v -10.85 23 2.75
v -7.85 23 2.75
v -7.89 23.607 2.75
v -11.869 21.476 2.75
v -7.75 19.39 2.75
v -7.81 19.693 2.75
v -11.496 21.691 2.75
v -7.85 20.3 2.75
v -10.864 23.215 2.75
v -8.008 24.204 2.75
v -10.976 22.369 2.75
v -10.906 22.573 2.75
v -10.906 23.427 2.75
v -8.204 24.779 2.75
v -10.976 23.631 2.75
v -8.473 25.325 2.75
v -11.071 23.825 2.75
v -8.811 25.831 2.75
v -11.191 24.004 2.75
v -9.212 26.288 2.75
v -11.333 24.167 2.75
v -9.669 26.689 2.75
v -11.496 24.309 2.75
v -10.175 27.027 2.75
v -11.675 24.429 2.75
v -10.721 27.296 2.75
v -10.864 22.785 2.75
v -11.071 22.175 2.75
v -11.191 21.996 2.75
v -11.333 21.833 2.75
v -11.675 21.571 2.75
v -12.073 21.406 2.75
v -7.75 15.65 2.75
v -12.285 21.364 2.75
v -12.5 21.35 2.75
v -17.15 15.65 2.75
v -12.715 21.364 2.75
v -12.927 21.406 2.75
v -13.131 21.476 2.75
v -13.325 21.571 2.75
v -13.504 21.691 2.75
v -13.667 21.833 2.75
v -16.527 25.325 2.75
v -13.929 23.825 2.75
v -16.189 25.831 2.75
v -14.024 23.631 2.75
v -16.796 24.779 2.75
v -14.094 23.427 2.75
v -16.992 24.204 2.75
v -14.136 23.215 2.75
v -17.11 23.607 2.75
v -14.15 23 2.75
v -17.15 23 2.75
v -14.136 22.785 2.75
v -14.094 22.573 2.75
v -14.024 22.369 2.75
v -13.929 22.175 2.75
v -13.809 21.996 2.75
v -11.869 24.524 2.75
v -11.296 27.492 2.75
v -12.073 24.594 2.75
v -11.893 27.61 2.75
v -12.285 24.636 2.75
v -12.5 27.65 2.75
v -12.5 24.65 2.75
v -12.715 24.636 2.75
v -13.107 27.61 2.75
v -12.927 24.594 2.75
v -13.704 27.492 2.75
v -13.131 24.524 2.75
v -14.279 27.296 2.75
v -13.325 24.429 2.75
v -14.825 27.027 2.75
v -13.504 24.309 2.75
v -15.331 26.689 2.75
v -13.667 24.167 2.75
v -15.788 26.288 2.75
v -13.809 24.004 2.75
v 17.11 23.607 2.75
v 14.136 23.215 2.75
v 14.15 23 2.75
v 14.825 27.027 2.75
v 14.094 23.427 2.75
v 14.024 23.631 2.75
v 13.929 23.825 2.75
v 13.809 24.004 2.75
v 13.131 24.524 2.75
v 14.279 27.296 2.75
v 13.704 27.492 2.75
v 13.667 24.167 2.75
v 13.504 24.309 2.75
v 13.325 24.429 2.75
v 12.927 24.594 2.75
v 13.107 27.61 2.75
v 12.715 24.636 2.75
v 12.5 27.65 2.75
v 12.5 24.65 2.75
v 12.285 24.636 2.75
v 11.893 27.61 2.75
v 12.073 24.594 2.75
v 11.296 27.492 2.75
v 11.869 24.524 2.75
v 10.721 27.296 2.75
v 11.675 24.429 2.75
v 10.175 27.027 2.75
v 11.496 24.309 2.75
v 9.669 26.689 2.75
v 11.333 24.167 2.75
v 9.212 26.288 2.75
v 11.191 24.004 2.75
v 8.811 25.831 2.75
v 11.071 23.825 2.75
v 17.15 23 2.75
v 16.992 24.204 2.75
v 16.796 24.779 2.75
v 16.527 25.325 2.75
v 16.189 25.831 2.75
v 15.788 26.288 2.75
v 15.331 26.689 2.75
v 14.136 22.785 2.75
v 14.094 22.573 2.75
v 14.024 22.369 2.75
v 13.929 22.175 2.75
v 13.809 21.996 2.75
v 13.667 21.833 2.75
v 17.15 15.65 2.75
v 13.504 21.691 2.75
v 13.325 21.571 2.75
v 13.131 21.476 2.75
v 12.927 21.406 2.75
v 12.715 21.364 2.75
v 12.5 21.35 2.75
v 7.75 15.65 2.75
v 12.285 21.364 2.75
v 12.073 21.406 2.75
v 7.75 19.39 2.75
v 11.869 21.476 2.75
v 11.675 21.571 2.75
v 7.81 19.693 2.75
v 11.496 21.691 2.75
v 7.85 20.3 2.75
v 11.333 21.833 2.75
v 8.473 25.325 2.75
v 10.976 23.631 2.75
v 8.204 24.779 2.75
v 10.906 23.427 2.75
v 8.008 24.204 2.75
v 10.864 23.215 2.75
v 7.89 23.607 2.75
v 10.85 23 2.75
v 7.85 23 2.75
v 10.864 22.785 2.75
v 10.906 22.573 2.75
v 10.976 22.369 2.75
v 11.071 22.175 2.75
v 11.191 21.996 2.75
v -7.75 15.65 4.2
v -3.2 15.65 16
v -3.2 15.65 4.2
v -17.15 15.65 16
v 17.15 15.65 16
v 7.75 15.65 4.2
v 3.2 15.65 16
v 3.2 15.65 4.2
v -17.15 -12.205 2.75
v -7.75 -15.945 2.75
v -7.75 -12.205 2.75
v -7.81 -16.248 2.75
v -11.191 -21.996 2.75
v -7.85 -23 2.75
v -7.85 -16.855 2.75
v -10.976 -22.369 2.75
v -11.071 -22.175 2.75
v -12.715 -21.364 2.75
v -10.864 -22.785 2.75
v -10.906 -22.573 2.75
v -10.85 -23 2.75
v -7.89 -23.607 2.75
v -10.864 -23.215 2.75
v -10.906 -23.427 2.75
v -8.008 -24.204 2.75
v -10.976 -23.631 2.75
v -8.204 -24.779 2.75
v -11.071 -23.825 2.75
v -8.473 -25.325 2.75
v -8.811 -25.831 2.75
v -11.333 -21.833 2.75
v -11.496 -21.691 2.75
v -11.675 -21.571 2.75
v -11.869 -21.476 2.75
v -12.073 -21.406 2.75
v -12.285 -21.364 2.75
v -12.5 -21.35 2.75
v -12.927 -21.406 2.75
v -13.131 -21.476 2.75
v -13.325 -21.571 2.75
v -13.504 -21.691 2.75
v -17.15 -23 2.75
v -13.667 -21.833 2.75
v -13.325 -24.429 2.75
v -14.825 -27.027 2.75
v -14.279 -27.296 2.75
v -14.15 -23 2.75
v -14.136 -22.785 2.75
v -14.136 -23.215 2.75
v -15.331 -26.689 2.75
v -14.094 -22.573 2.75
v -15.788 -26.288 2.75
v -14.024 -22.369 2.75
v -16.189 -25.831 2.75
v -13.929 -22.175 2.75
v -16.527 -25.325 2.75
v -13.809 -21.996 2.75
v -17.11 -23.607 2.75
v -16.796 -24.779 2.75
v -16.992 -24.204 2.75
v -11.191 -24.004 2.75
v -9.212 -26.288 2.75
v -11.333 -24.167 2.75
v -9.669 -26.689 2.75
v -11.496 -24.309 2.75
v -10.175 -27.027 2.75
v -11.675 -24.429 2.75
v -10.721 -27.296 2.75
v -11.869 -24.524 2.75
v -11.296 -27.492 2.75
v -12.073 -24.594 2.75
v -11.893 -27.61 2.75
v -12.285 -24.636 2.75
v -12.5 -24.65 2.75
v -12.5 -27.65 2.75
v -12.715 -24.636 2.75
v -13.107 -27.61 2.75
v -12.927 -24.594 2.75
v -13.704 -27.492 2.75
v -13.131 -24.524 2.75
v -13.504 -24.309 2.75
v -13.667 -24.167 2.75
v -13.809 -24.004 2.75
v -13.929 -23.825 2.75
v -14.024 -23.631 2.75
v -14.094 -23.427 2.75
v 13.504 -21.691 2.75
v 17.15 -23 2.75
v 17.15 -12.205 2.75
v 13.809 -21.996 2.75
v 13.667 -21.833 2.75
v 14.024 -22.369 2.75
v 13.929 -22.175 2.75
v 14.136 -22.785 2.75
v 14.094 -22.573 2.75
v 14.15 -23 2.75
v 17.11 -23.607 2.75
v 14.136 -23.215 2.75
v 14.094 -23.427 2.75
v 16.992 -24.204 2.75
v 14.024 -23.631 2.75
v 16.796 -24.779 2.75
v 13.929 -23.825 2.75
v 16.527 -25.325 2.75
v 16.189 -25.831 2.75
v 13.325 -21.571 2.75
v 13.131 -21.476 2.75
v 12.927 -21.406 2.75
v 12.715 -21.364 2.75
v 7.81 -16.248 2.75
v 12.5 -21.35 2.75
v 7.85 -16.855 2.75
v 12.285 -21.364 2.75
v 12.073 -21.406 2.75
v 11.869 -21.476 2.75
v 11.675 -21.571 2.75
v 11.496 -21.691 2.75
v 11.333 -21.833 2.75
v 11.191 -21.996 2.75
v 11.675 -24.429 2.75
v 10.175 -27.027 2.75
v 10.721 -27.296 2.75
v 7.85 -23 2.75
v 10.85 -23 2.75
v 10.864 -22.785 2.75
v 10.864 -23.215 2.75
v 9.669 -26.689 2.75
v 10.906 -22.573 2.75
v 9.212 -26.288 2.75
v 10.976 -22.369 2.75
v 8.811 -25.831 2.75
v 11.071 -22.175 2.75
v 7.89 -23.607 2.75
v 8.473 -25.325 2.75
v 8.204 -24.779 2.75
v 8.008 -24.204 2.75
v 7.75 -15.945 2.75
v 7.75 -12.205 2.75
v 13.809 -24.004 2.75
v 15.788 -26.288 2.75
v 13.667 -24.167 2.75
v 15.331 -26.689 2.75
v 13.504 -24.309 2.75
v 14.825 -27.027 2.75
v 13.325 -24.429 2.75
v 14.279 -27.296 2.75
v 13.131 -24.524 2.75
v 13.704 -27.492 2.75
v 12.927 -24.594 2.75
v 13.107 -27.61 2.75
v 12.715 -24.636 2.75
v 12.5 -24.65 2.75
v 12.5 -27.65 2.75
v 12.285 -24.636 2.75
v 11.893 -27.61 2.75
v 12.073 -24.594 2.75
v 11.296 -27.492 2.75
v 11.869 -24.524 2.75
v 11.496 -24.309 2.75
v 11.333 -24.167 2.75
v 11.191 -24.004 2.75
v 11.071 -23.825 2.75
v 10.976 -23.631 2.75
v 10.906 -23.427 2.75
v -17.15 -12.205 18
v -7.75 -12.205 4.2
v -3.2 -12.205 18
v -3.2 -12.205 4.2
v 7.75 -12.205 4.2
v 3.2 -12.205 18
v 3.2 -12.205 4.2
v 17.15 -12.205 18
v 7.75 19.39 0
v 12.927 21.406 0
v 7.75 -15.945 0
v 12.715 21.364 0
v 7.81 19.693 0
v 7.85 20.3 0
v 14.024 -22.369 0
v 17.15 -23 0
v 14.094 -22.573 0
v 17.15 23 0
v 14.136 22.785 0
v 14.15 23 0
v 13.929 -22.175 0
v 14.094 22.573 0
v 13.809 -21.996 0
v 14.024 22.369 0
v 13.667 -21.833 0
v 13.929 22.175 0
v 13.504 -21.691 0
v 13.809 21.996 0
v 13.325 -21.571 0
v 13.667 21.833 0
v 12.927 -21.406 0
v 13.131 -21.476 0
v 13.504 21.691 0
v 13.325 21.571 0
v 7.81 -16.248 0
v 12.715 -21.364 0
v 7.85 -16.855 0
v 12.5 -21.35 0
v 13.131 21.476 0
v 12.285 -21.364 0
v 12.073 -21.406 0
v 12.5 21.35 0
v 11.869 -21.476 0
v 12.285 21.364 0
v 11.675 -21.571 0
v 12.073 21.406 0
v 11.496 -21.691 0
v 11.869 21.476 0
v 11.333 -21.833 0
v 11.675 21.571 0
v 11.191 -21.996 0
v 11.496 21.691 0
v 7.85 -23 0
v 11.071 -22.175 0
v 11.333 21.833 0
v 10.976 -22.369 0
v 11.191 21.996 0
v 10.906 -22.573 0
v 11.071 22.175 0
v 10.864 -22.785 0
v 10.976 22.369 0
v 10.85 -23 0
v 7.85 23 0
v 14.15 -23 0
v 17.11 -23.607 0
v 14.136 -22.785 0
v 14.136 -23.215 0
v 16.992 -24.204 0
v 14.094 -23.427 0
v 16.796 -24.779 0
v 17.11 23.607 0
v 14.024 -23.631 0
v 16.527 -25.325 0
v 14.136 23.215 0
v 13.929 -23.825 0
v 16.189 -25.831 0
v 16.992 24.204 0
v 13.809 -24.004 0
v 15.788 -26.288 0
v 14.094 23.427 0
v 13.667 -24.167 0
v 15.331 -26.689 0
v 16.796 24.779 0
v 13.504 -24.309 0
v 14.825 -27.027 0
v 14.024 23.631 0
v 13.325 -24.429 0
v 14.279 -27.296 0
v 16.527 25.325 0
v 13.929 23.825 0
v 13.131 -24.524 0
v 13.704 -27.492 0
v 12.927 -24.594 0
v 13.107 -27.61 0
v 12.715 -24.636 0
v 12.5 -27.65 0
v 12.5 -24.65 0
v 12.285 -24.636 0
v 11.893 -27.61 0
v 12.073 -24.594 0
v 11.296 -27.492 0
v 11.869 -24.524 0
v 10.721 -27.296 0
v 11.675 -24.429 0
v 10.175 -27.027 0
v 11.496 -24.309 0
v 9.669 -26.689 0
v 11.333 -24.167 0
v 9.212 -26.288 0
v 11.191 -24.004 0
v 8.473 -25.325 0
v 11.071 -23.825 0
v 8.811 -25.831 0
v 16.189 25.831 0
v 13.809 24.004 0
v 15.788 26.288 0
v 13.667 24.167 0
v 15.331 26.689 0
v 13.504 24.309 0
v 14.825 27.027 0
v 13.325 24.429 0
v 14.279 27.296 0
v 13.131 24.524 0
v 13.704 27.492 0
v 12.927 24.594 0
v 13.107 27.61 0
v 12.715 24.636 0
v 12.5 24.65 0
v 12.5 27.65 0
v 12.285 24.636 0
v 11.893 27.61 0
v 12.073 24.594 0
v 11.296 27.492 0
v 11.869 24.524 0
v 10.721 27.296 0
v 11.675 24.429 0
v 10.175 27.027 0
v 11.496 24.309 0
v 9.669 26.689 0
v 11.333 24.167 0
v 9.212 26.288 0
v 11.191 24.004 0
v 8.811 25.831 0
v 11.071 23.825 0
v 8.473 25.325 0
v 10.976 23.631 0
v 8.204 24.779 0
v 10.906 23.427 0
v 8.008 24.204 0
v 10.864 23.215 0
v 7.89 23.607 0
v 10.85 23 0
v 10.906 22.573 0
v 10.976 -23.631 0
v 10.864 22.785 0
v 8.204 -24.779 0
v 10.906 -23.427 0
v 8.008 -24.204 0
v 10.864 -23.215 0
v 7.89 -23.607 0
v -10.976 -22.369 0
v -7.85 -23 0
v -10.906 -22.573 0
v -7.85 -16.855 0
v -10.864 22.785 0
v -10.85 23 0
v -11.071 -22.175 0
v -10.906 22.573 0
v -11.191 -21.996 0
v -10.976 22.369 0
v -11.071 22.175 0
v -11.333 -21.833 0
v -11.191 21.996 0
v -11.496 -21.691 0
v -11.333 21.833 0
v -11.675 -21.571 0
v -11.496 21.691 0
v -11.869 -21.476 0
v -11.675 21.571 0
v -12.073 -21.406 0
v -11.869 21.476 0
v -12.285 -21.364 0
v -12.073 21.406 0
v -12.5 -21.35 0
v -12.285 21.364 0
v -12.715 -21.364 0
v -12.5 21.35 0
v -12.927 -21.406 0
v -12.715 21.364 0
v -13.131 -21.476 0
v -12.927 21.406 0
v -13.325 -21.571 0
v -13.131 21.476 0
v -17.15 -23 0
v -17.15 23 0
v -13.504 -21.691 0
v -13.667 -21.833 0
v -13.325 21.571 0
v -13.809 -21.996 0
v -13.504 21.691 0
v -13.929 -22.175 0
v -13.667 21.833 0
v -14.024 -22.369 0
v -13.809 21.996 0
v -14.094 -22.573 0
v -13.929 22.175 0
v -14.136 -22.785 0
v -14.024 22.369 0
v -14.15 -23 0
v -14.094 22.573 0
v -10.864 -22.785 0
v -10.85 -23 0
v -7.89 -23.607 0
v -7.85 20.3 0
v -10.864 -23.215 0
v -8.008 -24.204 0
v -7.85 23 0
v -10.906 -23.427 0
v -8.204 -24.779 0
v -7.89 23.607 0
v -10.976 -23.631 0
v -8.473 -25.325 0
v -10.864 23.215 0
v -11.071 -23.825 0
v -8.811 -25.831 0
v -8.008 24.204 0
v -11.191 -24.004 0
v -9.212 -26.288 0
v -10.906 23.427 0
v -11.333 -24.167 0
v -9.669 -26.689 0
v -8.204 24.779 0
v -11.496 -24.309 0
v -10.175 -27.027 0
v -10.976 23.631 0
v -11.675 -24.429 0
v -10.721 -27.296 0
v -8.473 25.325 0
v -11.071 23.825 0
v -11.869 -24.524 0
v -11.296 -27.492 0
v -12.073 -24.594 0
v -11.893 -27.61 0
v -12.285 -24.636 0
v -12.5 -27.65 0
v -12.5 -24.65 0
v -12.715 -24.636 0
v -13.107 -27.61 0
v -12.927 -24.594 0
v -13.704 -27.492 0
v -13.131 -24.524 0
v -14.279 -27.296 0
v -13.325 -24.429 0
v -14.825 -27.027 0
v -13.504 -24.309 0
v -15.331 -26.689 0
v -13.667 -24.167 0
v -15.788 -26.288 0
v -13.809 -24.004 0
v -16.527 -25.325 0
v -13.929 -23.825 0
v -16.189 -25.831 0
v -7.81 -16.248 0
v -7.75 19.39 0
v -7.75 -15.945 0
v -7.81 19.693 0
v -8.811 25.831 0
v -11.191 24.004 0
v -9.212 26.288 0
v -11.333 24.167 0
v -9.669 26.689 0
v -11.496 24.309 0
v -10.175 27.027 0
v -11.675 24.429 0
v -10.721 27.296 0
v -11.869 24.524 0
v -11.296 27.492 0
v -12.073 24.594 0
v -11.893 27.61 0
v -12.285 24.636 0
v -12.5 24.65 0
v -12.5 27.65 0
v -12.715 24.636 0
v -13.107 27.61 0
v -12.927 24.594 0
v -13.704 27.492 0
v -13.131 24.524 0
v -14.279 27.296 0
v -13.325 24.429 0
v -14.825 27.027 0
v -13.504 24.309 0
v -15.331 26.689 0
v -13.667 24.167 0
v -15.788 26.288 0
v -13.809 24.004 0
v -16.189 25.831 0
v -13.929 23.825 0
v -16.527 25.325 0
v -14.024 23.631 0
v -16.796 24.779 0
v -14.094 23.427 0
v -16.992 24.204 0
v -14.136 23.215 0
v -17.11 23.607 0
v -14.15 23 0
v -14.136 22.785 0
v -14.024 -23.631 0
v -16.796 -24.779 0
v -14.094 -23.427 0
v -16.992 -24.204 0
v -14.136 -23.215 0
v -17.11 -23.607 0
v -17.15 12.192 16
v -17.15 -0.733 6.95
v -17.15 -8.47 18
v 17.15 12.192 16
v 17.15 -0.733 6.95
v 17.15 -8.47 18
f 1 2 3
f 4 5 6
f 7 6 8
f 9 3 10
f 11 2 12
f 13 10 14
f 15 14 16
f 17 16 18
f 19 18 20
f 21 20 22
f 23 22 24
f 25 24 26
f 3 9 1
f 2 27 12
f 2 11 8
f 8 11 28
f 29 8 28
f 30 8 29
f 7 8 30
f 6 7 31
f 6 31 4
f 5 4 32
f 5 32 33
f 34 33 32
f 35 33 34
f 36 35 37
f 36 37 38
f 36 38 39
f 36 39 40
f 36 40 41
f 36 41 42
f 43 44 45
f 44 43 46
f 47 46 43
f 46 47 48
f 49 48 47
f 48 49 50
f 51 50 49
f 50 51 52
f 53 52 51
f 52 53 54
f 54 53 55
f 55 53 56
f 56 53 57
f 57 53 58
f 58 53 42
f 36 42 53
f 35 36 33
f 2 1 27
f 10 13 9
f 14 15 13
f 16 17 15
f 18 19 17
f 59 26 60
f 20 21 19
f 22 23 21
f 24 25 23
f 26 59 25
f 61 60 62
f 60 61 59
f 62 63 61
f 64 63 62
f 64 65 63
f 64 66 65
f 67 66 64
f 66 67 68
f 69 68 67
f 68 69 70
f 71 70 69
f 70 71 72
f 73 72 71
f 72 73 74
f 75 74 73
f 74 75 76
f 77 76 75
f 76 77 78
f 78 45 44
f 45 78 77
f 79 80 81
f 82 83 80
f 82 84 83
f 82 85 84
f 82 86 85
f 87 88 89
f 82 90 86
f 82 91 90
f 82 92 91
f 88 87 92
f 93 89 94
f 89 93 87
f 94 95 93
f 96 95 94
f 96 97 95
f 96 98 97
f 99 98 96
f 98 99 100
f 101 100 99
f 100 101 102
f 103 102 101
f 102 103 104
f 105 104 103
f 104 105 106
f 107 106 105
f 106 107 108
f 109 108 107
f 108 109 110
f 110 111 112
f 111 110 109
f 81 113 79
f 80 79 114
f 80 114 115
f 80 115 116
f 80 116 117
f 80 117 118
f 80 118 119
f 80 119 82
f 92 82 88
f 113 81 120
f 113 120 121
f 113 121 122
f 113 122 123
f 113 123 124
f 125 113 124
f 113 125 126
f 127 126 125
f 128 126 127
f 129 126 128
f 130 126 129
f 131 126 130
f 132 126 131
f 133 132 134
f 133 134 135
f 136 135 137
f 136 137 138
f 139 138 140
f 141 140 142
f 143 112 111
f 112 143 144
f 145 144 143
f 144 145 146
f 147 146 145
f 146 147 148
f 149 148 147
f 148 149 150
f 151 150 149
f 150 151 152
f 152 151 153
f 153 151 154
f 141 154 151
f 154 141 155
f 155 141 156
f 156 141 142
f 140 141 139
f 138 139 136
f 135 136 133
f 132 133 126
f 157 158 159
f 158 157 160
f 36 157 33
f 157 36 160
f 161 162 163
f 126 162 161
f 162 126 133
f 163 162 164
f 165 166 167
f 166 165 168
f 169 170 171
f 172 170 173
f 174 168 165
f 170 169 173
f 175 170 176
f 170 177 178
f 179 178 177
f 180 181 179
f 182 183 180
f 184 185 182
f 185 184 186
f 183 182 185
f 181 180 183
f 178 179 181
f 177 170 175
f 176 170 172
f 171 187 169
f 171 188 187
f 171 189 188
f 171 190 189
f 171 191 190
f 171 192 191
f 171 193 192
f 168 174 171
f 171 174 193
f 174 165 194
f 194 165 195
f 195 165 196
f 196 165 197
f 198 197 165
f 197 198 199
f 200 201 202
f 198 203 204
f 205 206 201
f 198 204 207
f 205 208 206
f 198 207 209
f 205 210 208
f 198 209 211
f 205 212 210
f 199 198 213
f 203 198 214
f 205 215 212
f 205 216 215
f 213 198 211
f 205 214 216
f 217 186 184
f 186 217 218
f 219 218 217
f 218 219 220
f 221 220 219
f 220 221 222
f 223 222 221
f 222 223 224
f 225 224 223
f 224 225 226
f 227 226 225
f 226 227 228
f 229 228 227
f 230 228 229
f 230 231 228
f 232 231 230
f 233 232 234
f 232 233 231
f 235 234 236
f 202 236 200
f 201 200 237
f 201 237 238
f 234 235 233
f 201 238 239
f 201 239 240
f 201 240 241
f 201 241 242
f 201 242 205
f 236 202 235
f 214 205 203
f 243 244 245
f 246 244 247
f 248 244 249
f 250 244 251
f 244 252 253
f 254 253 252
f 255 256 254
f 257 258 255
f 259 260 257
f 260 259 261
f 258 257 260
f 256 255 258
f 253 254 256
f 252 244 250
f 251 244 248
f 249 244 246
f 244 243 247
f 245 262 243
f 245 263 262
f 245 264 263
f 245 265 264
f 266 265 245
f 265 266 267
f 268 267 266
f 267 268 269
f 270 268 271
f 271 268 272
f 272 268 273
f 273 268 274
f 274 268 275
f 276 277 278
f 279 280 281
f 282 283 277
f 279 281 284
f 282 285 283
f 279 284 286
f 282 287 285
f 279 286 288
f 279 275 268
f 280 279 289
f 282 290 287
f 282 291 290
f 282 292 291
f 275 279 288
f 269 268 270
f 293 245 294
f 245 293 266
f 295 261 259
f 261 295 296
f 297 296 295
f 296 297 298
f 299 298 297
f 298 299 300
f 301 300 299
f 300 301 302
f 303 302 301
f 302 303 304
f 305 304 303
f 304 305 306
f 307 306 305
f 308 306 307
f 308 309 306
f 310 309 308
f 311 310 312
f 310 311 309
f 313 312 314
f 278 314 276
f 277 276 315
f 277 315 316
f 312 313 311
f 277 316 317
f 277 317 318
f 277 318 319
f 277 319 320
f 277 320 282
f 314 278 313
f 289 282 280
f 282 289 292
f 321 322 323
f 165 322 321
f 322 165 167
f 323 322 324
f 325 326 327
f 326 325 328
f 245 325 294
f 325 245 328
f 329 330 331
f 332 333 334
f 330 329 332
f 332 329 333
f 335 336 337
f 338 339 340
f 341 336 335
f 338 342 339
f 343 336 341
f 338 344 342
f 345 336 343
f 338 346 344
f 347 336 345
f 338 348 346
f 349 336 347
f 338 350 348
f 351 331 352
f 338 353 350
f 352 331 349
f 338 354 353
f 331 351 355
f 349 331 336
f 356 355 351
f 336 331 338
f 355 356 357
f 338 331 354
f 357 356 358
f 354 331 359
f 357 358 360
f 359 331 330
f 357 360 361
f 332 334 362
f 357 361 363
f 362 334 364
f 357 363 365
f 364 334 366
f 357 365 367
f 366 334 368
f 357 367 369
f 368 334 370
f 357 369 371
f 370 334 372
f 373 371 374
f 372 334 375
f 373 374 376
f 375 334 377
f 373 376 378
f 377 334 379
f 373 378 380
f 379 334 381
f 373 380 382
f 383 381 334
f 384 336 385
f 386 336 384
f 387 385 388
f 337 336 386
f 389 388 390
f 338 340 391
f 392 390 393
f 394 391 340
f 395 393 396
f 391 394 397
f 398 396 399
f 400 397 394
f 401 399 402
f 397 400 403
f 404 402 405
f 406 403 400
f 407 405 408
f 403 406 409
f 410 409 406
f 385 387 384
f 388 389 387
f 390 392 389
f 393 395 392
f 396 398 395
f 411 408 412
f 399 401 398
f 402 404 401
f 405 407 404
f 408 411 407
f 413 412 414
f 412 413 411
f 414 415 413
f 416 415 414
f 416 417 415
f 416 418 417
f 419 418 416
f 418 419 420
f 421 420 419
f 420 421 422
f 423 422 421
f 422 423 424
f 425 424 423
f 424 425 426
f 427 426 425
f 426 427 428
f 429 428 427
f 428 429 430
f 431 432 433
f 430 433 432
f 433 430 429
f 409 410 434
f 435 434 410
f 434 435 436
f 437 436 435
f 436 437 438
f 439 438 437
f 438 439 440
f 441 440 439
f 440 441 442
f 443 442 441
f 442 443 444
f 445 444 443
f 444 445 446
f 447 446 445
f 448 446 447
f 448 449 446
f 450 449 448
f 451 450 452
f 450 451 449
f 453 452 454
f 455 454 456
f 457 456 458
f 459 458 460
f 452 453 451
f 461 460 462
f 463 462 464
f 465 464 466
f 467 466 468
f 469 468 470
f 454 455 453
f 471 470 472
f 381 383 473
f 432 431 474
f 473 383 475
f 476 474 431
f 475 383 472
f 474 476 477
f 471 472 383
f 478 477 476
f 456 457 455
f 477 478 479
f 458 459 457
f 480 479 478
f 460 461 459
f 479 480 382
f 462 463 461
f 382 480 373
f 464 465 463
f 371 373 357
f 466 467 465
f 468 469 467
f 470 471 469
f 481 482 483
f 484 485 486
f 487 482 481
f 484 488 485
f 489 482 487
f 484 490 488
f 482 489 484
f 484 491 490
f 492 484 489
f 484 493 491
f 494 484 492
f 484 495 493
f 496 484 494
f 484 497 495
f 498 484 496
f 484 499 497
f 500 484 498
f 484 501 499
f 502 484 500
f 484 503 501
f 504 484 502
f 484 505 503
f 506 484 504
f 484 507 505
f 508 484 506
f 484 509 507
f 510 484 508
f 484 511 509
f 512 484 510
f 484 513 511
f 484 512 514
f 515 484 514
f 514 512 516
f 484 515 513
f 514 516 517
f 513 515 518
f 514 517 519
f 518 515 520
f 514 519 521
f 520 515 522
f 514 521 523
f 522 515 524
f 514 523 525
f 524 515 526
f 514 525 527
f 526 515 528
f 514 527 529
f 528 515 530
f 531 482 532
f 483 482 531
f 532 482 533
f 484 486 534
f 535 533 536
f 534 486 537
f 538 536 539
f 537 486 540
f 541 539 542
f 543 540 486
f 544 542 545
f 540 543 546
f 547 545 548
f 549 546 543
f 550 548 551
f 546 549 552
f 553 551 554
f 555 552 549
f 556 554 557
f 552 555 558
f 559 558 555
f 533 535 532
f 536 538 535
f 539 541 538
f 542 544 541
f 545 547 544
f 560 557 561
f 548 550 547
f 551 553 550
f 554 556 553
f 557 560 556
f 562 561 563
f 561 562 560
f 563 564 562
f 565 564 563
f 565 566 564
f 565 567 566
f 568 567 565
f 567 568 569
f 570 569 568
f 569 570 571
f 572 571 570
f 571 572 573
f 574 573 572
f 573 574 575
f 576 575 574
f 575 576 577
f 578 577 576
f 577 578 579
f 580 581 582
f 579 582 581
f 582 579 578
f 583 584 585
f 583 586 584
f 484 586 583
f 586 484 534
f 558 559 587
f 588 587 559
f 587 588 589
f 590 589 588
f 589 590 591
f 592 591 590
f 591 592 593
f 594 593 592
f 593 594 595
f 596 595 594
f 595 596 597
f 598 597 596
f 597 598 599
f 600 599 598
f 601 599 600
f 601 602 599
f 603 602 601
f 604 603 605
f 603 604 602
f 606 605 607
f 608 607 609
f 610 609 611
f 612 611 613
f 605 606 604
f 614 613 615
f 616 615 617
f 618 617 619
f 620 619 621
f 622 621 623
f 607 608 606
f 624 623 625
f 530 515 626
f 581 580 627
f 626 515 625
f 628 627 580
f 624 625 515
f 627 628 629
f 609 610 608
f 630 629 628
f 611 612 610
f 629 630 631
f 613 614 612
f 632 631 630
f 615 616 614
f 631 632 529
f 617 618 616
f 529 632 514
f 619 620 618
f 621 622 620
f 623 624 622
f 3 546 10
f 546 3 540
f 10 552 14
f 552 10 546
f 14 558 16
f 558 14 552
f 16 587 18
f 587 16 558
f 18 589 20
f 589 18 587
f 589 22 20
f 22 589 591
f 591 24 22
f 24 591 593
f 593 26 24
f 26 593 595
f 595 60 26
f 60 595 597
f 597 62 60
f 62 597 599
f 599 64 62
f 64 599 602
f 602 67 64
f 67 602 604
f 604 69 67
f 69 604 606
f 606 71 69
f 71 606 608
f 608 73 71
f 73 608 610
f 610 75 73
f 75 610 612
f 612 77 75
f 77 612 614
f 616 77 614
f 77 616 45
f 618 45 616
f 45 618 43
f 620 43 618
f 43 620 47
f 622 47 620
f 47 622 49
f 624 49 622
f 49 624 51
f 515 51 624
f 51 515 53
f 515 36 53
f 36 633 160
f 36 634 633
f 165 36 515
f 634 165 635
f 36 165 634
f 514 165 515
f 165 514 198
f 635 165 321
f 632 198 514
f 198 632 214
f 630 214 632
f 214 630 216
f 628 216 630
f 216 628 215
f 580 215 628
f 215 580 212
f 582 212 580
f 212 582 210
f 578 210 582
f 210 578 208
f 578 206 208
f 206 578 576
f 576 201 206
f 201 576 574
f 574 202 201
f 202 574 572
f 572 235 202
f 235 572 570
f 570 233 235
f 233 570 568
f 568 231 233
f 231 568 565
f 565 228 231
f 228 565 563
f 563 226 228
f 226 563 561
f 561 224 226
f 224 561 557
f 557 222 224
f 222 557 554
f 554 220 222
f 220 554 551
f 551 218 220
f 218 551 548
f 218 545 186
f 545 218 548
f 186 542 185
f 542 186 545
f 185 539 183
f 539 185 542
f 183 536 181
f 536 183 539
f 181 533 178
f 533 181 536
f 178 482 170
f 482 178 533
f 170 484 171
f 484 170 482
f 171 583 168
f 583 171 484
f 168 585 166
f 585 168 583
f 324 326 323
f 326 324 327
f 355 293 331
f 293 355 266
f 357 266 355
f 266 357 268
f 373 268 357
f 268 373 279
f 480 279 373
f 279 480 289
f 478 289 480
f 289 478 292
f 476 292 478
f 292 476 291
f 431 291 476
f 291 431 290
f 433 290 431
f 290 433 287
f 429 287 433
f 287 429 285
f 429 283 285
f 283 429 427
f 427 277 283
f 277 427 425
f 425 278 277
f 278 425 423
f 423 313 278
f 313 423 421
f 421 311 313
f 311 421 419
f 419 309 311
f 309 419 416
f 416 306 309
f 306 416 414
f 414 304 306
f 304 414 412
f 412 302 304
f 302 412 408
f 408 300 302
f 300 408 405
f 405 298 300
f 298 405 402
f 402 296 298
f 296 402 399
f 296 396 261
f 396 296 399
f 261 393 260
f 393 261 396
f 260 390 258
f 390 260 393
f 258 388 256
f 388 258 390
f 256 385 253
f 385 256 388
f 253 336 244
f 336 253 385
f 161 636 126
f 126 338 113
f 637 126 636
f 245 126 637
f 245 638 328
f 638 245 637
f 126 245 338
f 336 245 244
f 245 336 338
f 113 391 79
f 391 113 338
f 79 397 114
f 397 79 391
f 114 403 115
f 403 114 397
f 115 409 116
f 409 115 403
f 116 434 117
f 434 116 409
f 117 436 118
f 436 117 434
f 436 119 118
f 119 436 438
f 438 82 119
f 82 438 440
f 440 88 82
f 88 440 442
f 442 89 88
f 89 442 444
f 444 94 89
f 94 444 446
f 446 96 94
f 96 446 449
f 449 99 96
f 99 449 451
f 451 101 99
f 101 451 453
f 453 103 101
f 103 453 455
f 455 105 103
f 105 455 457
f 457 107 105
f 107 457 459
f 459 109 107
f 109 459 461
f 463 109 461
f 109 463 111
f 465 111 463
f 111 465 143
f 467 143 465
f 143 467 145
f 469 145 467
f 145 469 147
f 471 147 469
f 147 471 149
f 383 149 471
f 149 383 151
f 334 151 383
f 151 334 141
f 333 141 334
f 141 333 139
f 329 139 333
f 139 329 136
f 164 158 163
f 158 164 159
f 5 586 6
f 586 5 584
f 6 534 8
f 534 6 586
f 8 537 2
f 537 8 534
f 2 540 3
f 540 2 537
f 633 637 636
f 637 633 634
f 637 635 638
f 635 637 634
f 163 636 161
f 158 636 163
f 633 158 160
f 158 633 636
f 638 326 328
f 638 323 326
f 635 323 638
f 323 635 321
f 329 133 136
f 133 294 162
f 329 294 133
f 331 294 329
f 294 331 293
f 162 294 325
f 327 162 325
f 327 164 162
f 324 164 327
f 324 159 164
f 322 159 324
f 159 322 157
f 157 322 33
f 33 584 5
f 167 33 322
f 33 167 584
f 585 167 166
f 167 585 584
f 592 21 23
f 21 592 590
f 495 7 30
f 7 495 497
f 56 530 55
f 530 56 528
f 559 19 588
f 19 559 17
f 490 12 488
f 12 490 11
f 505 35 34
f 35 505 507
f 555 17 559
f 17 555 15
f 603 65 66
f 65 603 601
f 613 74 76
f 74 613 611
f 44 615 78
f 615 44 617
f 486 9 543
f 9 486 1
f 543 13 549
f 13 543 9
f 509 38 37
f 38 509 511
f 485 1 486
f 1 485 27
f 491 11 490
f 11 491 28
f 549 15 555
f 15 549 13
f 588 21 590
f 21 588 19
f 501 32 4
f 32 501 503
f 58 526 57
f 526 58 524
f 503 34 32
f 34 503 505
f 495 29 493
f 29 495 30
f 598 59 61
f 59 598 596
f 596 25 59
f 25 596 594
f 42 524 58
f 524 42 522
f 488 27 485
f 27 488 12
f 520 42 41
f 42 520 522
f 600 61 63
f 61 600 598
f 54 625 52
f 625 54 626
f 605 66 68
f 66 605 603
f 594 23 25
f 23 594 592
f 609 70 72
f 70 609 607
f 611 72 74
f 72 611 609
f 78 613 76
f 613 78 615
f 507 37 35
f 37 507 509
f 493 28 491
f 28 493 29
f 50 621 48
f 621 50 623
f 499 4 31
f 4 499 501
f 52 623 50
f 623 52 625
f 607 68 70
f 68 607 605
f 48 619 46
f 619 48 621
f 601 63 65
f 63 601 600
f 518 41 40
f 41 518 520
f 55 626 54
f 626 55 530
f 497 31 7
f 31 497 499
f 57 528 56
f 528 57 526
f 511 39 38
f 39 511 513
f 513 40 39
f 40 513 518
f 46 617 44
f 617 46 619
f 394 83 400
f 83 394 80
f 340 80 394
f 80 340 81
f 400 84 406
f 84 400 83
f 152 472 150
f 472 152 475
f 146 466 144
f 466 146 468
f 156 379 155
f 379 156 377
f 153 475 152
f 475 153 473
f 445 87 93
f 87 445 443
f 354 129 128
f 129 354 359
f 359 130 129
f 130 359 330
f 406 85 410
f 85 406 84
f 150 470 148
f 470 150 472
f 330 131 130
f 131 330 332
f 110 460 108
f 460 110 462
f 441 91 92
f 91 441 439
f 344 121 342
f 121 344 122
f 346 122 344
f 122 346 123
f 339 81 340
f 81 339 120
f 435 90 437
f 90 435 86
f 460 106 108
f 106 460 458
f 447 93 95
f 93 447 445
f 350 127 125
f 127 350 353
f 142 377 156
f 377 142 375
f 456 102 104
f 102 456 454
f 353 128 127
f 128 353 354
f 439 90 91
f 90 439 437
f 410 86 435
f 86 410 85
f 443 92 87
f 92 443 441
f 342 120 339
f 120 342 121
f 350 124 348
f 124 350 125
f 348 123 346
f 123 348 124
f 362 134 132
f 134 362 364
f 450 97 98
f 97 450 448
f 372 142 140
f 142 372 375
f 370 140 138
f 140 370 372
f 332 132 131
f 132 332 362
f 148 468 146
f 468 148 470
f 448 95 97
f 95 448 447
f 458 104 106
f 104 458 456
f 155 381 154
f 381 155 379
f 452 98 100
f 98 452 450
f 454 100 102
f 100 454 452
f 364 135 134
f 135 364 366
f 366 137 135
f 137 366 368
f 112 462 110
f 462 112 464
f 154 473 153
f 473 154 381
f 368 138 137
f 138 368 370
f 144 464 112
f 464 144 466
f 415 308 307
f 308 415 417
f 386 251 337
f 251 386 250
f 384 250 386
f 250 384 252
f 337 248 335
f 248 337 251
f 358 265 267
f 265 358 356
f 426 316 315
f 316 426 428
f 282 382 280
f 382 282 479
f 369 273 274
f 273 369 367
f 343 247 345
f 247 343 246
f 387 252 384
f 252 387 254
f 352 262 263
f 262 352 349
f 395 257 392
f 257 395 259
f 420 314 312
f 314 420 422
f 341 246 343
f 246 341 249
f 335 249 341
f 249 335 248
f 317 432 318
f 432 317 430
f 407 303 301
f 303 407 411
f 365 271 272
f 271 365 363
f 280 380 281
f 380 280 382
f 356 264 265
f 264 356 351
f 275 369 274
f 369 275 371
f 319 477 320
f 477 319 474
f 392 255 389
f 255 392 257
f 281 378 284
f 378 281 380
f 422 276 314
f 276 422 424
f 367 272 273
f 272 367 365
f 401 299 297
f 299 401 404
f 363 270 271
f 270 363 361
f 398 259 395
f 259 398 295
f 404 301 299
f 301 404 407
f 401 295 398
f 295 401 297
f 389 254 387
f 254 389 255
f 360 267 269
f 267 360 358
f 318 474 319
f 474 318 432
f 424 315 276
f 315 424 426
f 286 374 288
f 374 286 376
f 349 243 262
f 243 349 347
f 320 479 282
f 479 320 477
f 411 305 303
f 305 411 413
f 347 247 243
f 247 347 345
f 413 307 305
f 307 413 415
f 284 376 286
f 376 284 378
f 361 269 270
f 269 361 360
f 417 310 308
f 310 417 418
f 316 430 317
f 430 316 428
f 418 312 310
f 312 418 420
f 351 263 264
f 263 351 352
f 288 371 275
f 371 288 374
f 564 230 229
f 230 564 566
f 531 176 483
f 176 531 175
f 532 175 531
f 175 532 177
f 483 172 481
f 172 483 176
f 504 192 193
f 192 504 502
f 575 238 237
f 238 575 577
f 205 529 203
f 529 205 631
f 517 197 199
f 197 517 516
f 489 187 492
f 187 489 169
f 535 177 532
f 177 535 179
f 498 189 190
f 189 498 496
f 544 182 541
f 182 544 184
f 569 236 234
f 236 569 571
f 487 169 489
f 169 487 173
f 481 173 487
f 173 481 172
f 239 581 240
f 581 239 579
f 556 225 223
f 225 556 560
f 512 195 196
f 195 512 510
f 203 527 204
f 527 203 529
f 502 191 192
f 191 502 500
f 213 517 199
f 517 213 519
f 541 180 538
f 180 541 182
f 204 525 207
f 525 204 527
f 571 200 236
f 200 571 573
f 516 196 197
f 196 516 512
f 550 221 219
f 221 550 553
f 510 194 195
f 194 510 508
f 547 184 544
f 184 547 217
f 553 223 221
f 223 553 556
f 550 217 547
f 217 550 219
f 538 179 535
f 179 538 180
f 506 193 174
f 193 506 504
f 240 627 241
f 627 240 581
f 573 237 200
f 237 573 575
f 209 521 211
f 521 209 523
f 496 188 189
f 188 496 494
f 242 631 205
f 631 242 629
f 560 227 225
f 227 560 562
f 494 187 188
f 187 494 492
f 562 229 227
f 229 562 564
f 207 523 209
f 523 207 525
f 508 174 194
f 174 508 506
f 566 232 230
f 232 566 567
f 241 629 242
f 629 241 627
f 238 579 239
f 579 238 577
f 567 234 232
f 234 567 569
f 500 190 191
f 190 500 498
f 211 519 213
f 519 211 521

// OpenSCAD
//Depth of camera
camera_depth = 20;
//Height of the supporting back
back_height = 20;
//C/C Distance between front holes
front_cc = 25;
//C/C Distance between rear holes
rear_cc = 25;
//C/C Distance between front and rear holes
front_rear_cc = 46;
//angle of camera
angle = 35; //[10:45]
//Thickness of the base
base_thickness = 2.75;
//Hole diameter (may need adjustment depending on printer)
hole_size = 3.3;
//Determines the amount of "meat" around the holes
edge_margin = 3;
//Diameter of screw head (to allow enough clerance)
screw_head_size = 6.1;
//Wedge offset from front
front_offset = 12;
//Add lip to fron of wedge
use_lip = "No"; //[Yes,No]
//Velcro strap width
velcro_width = 17;
//Velcro strap thickness
velcro_thickness = 4.2;
//antenna holder angle
angle2 = 85;
antDist = 7;


//Calculated variables wont be visible to Thingiverse customizer
hole_clearence = edge_margin+hole_size/2;
screw_head_clerance = screw_head_size / 2;
hole_radius = hole_size / 2;
lip_thickness = use_lip == "Yes" ? 5*1 : 0*1;
lip_height =  use_lip == "Yes" ? 5*1 : 0*1;

//internal global varaibles
_xFrontOffset = front_cc/2;
_xRearOffset = rear_cc/2;
_xTotFrontOffset = front_cc/2+hole_clearence;
_xTotRearOffset = rear_cc/2+hole_clearence;
_yOffset = front_rear_cc/2;
_yTotOffset = front_rear_cc/2+hole_clearence;
_cameraHolderDepth = (lip_thickness+camera_depth)*cos(angle)+back_height*sin(angle)+lip_thickness;
_cameraHolderHeight = back_height*cos(angle) + base_thickness + velcro_thickness;
_wedgeStartYoffset = _yTotOffset - front_offset;
_wedgeEndYoffset = _yTotOffset - front_offset - _cameraHolderDepth;
_rearSpaceLeft = _yTotOffset * 2 - front_offset - _cameraHolderDepth;
_totWidth = front_cc > rear_cc ? front_cc + hole_clearence*2 : rear_cc + hole_clearence*2;
_velcroXpos = (velcro_width + edge_margin) < (front_cc+2*edge_margin+hole_size) / 2 ? 0 :  ((front_cc+2*edge_margin+hole_size) / 2 )-(velcro_width + edge_margin);


/**
 *
 */
module tube(inDia, outDia, height) {
	difference(){
		cylinder(h = height, r = outDia/2, $fn=50);
		translate([0, 0, -0.5]) { cylinder(h = height+1, r = inDia/2, $fn=30); }
	}
}

module createBase()
{   
           
    difference()
    {
        linear_extrude( height = _cameraHolderHeight)
        {
            union()
            {
                if( front_offset > 0 )
                {
                    polygon(
                                points = [  [-_xTotFrontOffset, _yOffset],
                                            [-_xFrontOffset+hole_clearence, _yOffset],
                                            [-_xFrontOffset+hole_clearence, _wedgeStartYoffset],
                                            [_xFrontOffset-hole_clearence, _wedgeStartYoffset],
                                            [_xFrontOffset-hole_clearence, _yOffset],
                                            [_xTotFrontOffset, _yOffset], 
                                            [_xTotRearOffset, -_yOffset], 
                                            [_xRearOffset-hole_clearence, -_yOffset], 
                                            [_xRearOffset-hole_clearence, _wedgeEndYoffset], 
                                            [-_xRearOffset+hole_clearence, _wedgeEndYoffset], 
                                            [-_xRearOffset+hole_clearence, -_yOffset], 
                                            [-_xTotRearOffset, -_yOffset] ], 
                                convexity = 10);
                } else {
                    polygon(
                                points = [  [-_xFrontOffset, _yOffset+hole_clearence],                                        [_xFrontOffset, _yOffset+hole_clearence], 
                                            [_xTotFrontOffset, _yOffset], 
                                            [_xTotRearOffset, -_yOffset], 
                                            [_xRearOffset-hole_clearence, -_yOffset], 
                                            [_xRearOffset-hole_clearence, _wedgeEndYoffset], 
                                            [-_xRearOffset+hole_clearence, _wedgeEndYoffset], 
                                            [-_xRearOffset+hole_clearence, -_yOffset], 
                                            [-_xTotRearOffset, -_yOffset],
                                            [-_xTotFrontOffset, _yOffset]],
                                convexity = 10);
                }
                translate([-_xFrontOffset, _yOffset, 0])
                circle(r=hole_clearence, center = false); 
                translate([_xFrontOffset, _yOffset, 0])
                circle(r=hole_clearence, center = false); 
                translate([_xRearOffset, -_yOffset, 0])
                circle(r=hole_clearence, center = false); 
                translate([-_xRearOffset, -_yOffset, 0])
                circle(r=hole_clearence, center = false); 
                if(front_offset > hole_clearence*2)
                {
                    difference()
                    {
                        union()
                        {
                            translate([_xFrontOffset-hole_clearence*2, _wedgeStartYoffset, 0])
                            square([hole_clearence,hole_clearence]);
                            translate([-_xFrontOffset+hole_clearence, _wedgeStartYoffset, 0])
                            square([hole_clearence,hole_clearence]);
                        }
                        union()
                        {
                            translate([_xFrontOffset-hole_clearence*2, _wedgeStartYoffset+hole_clearence, 0])
                            circle(r=hole_clearence, center = false); 
                            translate([-_xFrontOffset+hole_clearence*2, _wedgeStartYoffset+hole_clearence, 0])                circle(r=hole_clearence, center = false);   
                        }
                    }
                }
                if((_yTotOffset + _wedgeEndYoffset) > hole_clearence*2)
                {
                    difference()
                    {
                        union()
                        {
                            translate([_xRearOffset-hole_clearence*2, _wedgeEndYoffset-hole_clearence, 0])
                            square([hole_clearence,hole_clearence]);
                            translate([-_xRearOffset+hole_clearence, _wedgeEndYoffset-hole_clearence, 0])
                            square([hole_clearence,hole_clearence]);
                            
                        }
                        union()
                        {
                            translate([_xRearOffset-hole_clearence*2, _wedgeEndYoffset-hole_clearence, 0])
                            circle(r=hole_clearence, center = false); 
                            translate([-_xRearOffset+hole_clearence*2, _wedgeEndYoffset-hole_clearence, 0])
                            circle(r=hole_clearence, center = false); 
                        }
                    }
                }
            }
        }
        union()
        {
            translate([-_totWidth/2, _wedgeStartYoffset, base_thickness])
            cube([_totWidth,front_rear_cc,_cameraHolderHeight], center = false);
            rearSpace = _yTotOffset + _wedgeEndYoffset;
            translate([-_totWidth/2, _wedgeEndYoffset-rearSpace, base_thickness])
            cube([_totWidth,rearSpace,_cameraHolderHeight], center = false);
        }
    }    
}

module addWedge()
{
    totWidth = front_cc > rear_cc ? front_cc + edge_margin*2+hole_size: rear_cc + edge_margin*2+hole_size;
                xOffset = totWidth/2;  
    difference()
    {
        difference()
        {
            children();
            union()
            {
                          
                yOffset = (front_rear_cc/2+edge_margin+hole_size/2)-(lip_thickness+camera_depth)*cos(angle) -front_offset;
                translate([-xOffset, yOffset, base_thickness+velcro_thickness])
                rotate([angle,0,0])
                cube([totWidth, camera_depth, back_height+5], center = false);
                
                
        }
       union()
       {
           yOffset = (front_rear_cc/2+edge_margin+hole_size/2)-lip_thickness*cos(angle) -front_offset; 
                zOffset = base_thickness+velcro_thickness + camera_depth*sin(angle);
                translate([-xOffset, yOffset, zOffset])
                rotate([angle,0,0])
                translate([0, -1, lip_height])
                cube([totWidth, front_rear_cc, back_height+5], center = false);
                translate([-xOffset, yOffset, zOffset])
                rotate([angle,0,0])
                translate([0, lip_thickness, 0])
                cube([totWidth, front_rear_cc, back_height+5], center = false);
           
       } 
    }
    
        translate([0,15,10+16]) cube([50, 10, 20], center = true);
        translate([0,-12,10+18]) cube([50, 10, 20], center = true);
    }
    
    
}

module addStrapHole()
{
    difference()
    {
        children();
        union()
        {
            /****
            yOffset = (front_rear_cc/2+edge_margin+hole_size/2)-lip_thickness*cos(angle) -front_offset; 
            zOffset = base_thickness+velcro_thickness + camera_depth*sin(angle);
            translate([0, yOffset, zOffset])
            rotate([angle,0,0])
            translate([_velcroXpos, 0, -zOffset+base_thickness])
            cube([velcro_width, lip_thickness+1, zOffset*2], center = false);
            ySize = camera_depth + base_thickness + velcro_thickness;
            translate([0, yOffset, zOffset])
            rotate([angle,0,0])            
            translate([_velcroXpos, -ySize, -base_thickness-velcro_thickness])
            cube([velcro_width, ySize+1, velcro_thickness], center = false);
            translate([0, yOffset, zOffset])
            rotate([angle,0,0])            
            translate([_velcroXpos, -ySize, -base_thickness-velcro_thickness])            
            cube([velcro_width, velcro_thickness, back_height*1.5], center = false);
            ****/
            
            /***
            translate([0,6,base_thickness+velcro_thickness]){ 
                rotate([angle,0,0]){
                    cube([_totWidth, velcro_width, velcro_thickness], center = true);
                }
            }
            ***/
            
            translate([0,0,velcro_thickness/2]){ 
                    cube([velcro_width-1.5,_totWidth+20, velcro_thickness], center = true);
            }
            
            translate([0,_wedgeStartYoffset+4.2,0]){
                ///rotate([angle,0,0]) cube([velcro_width,5.5, 40], center = true);
            }
        }
    }
}

module clearForScrews()
{
    xOffsetFront = front_cc/2;
    xOffsetRear = rear_cc/2;
    yOffset = front_rear_cc/2;
    
    difference()
    {
        children();
        union()
        {
            //Screw holes
            translate([-xOffsetFront, yOffset, (base_thickness+1)/2])
            cylinder(h=base_thickness+1, r=hole_radius, center = true); 
            translate([xOffsetFront, yOffset, (base_thickness+1)/2])
            cylinder(h=base_thickness+1, r=hole_radius, center = true); 
            translate([xOffsetRear, -yOffset, (base_thickness+1)/2])
            cylinder(h=base_thickness+1, r=hole_radius, center = true); 
            translate([-xOffsetRear, -yOffset, (base_thickness+1)/2])
            cylinder(h=base_thickness+1, r=hole_radius, center = true); 
            translate([xOffsetRear, -yOffset, 50+base_thickness])
            cylinder(h=100, r=screw_head_clerance, center = true);        translate([-xOffsetRear, -yOffset, 50+base_thickness])
            cylinder(h=100, r=screw_head_clerance, center = true);
            translate([-xOffsetFront, yOffset, 50+base_thickness])
            cylinder(h=100, r=screw_head_clerance, center = true);
            translate([xOffsetFront, yOffset, 50+base_thickness])
            cylinder(h=100, r=screw_head_clerance, center = true);
            /***
            for(i=[-1,1]){
            translate([i*antDist/2,-front_rear_cc/2-1,0]) rotate([0,i*angle2/2,0]) cylinder(r=hole_size/2, h=90, $fn=20,center=true);
}
            ***/
        }
    }
}


$fn = 48;
clearForScrews()
{
    addStrapHole()
    {
        addWedge()
        {
            createBase();
        }
    }
}

/**
//antenna holder
difference(){

for(i=[-1,1]){
translate([i*antDist/2,-front_rear_cc/2-1,0]) rotate([0,i*angle2/2,0]) tube(hole_size, 7.5, 15);
}

translate([0,0,-10/2]) cube(size=[100,100,10], center=true);
for(i=[-1,1]){
translate([i*antDist/2, -front_rear_cc/2-1,10/2+8]) cube(size=[27,10,10], center=true);
}

}//diff
**/
